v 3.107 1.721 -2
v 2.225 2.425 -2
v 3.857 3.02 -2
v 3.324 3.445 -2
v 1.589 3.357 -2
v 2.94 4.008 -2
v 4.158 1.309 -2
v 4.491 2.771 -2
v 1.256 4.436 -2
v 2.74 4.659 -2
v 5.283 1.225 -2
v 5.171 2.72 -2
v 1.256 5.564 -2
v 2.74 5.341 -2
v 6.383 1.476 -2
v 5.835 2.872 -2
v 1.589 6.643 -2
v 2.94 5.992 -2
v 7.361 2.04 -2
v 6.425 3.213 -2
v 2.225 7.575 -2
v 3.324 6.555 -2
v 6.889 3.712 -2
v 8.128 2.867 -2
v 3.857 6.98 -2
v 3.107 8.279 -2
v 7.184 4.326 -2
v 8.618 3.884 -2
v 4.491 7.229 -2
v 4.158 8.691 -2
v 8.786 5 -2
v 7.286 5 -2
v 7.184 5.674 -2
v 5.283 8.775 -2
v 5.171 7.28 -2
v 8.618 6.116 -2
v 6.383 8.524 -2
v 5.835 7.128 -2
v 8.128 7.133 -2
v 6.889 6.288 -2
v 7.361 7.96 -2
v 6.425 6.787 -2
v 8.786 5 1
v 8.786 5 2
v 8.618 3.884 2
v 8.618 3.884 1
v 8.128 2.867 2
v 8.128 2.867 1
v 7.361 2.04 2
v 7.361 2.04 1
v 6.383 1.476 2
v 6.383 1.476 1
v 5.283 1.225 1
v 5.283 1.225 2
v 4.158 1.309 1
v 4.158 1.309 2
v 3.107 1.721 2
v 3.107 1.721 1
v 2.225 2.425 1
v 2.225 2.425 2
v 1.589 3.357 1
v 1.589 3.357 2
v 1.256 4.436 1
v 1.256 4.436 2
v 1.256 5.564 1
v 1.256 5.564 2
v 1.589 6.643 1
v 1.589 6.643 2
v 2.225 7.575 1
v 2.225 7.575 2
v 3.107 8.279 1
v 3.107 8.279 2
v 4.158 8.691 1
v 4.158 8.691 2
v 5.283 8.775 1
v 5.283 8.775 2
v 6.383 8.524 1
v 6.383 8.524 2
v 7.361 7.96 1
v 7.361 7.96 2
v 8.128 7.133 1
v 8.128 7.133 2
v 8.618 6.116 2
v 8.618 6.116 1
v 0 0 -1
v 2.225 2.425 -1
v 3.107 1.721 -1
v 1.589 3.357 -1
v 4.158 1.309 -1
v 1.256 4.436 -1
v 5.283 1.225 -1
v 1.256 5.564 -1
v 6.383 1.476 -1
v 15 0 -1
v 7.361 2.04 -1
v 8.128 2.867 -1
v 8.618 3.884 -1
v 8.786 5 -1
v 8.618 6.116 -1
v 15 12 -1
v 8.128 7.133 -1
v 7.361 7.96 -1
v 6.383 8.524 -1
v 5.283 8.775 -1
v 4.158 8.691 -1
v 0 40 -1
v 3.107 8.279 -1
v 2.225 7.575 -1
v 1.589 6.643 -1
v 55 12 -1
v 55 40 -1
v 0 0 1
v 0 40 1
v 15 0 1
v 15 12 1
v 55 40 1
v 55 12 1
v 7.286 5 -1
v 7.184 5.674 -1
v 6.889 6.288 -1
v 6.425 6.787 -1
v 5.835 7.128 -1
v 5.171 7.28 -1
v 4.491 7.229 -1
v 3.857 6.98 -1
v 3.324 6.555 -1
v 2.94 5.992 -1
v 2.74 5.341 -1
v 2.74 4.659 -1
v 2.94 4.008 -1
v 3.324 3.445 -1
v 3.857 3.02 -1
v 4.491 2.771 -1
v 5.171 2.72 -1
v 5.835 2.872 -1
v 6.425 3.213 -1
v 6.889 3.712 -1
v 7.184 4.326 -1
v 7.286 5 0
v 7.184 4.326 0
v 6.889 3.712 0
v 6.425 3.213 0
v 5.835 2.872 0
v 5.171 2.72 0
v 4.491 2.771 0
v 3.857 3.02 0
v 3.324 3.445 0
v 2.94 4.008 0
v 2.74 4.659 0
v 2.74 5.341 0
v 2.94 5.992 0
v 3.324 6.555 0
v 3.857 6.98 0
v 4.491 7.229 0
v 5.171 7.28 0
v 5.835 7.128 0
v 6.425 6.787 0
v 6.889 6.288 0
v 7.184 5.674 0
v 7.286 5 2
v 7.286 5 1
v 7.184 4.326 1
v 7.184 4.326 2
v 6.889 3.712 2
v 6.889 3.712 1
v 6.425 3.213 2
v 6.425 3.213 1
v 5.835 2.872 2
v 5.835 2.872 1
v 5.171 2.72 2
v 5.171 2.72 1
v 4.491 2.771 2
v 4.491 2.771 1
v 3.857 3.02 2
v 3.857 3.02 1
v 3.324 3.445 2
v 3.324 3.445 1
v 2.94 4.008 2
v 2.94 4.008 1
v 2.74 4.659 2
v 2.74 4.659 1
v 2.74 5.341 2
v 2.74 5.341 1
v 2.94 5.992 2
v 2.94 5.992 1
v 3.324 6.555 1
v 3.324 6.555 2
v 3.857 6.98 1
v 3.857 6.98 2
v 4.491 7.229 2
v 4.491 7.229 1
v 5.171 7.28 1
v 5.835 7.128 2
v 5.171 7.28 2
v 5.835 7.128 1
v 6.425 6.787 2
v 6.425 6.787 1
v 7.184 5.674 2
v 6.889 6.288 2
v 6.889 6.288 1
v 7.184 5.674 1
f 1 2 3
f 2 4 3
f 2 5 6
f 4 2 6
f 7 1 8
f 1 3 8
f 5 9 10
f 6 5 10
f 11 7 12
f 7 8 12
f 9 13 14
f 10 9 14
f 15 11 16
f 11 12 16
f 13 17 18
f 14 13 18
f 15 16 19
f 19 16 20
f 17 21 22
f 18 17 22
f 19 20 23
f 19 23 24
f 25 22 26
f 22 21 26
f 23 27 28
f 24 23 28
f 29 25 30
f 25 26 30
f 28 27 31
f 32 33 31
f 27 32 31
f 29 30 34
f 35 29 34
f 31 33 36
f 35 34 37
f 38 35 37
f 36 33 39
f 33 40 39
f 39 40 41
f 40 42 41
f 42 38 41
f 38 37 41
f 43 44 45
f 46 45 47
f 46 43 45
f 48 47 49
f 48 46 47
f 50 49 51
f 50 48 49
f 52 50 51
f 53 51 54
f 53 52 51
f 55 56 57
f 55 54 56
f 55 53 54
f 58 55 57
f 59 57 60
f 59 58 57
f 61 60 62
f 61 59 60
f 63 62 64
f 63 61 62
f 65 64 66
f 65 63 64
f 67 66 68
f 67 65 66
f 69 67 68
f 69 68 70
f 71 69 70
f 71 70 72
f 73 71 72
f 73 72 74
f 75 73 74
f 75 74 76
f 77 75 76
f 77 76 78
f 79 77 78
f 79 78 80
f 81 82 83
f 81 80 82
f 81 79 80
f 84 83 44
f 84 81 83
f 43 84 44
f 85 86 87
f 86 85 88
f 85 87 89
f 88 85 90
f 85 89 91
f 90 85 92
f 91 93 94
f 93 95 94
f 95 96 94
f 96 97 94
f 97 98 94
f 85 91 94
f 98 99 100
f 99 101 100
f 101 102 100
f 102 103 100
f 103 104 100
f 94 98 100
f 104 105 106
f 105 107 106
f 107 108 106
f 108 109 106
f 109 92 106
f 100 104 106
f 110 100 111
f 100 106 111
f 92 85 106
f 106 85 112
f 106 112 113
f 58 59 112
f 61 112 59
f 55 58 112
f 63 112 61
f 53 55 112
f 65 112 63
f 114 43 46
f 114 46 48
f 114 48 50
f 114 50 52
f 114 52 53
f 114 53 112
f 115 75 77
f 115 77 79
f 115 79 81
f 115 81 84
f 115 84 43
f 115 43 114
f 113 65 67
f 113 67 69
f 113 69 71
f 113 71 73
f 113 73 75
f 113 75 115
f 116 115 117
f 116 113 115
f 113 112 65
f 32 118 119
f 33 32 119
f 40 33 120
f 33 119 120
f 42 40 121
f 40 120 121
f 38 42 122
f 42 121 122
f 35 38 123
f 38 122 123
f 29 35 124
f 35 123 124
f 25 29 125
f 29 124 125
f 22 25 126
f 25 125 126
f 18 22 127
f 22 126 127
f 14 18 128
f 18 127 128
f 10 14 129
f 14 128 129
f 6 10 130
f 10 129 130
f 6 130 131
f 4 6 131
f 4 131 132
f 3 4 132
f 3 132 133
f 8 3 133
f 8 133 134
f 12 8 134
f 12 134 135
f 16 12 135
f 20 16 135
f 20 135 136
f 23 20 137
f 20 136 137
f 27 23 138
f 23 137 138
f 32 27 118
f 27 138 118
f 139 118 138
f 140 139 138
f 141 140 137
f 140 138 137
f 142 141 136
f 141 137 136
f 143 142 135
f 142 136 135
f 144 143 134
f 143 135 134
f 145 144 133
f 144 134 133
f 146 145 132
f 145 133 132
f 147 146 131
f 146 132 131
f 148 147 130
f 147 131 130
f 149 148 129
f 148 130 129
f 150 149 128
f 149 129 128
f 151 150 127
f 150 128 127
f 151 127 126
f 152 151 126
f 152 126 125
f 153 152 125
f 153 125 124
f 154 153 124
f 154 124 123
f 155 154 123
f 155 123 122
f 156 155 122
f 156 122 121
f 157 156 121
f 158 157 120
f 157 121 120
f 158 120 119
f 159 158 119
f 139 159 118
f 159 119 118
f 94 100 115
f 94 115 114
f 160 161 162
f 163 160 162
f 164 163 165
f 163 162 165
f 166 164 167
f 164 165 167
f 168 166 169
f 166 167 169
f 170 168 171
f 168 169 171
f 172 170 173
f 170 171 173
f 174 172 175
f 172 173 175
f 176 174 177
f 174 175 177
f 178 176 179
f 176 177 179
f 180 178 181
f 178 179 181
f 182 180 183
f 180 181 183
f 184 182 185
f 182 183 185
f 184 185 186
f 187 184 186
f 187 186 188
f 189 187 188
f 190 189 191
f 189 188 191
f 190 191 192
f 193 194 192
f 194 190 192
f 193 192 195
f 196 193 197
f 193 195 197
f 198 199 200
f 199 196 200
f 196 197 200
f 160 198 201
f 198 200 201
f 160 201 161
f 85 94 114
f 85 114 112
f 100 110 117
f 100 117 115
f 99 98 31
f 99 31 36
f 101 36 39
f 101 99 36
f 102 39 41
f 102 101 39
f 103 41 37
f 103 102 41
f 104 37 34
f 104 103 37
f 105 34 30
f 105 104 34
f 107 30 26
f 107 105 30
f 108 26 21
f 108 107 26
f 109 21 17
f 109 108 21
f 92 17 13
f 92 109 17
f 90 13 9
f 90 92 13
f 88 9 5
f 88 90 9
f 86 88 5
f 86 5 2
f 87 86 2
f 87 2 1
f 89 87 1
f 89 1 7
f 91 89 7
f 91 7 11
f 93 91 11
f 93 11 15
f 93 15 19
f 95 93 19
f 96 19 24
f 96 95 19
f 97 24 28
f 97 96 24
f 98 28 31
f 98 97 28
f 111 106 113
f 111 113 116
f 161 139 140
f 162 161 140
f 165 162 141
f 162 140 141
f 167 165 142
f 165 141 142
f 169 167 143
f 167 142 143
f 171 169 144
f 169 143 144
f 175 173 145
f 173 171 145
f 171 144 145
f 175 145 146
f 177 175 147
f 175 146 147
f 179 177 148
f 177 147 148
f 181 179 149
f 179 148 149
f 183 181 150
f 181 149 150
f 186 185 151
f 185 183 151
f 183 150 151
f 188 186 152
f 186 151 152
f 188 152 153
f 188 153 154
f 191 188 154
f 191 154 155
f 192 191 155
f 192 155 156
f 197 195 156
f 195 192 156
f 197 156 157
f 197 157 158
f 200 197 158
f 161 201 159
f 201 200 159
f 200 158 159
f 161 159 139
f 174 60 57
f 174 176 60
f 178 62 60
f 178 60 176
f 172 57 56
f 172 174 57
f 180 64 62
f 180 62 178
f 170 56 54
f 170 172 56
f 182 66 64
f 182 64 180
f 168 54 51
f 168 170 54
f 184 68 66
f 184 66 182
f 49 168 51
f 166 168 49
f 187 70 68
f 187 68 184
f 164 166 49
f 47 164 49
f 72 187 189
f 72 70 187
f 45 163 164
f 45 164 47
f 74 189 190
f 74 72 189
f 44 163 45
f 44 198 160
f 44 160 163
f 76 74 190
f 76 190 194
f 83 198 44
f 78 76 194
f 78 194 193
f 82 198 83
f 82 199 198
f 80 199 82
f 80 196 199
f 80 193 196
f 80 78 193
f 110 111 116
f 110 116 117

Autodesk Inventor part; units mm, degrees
ref_plane "YZ Plane" through (0, 0, 0) normal (1, 0, 0) x (0, 1, 0)
ref_plane "XZ Plane" through (0, 0, 0) normal (0, 1, 0) x (-1, 0, 0)
ref_plane "XY Plane" through (0, 0, 0) normal (0, 0, 1) x (1, 0, 0)
sketch "Sketch1" plane through (0, 0, 0) normal (0, 0, 1) x (1, 0, 0)
  line L0 (0, 40) -> (55, 40)
  line L1 (55, 40) -> (55, 12)
  line L2 (7.5, 0) -> (0, 0)
  line L3 (0, 0) -> (0, 40)
  circle A0 centre (5, 5) radius 2.286
  circle A1 centre (5, 5) radius 3.786
  line L4 (55, 12) -> (15, 12)
  line L5 (15, 12) -> (15, 0)
  line L6 (15, 0) -> (0, 0)
  point P0 (0, 0)
  dimension "d2" = 0
  dimension "d3" = 0
  dimension "d4" = 4.572
  dimension "d7" = 1.5
  dimension "d13" = 28
  dimension "d14" = 55
extrude "Extrusion1" add sketch "Sketch1" along normal mid plane 2 contours L0 L1 L4 L5 L6 L2 L3 | A1
extrude "Extrusion2" add sketch "Sketch1" along normal mid plane 4 contours A1
properties part number "gate"
